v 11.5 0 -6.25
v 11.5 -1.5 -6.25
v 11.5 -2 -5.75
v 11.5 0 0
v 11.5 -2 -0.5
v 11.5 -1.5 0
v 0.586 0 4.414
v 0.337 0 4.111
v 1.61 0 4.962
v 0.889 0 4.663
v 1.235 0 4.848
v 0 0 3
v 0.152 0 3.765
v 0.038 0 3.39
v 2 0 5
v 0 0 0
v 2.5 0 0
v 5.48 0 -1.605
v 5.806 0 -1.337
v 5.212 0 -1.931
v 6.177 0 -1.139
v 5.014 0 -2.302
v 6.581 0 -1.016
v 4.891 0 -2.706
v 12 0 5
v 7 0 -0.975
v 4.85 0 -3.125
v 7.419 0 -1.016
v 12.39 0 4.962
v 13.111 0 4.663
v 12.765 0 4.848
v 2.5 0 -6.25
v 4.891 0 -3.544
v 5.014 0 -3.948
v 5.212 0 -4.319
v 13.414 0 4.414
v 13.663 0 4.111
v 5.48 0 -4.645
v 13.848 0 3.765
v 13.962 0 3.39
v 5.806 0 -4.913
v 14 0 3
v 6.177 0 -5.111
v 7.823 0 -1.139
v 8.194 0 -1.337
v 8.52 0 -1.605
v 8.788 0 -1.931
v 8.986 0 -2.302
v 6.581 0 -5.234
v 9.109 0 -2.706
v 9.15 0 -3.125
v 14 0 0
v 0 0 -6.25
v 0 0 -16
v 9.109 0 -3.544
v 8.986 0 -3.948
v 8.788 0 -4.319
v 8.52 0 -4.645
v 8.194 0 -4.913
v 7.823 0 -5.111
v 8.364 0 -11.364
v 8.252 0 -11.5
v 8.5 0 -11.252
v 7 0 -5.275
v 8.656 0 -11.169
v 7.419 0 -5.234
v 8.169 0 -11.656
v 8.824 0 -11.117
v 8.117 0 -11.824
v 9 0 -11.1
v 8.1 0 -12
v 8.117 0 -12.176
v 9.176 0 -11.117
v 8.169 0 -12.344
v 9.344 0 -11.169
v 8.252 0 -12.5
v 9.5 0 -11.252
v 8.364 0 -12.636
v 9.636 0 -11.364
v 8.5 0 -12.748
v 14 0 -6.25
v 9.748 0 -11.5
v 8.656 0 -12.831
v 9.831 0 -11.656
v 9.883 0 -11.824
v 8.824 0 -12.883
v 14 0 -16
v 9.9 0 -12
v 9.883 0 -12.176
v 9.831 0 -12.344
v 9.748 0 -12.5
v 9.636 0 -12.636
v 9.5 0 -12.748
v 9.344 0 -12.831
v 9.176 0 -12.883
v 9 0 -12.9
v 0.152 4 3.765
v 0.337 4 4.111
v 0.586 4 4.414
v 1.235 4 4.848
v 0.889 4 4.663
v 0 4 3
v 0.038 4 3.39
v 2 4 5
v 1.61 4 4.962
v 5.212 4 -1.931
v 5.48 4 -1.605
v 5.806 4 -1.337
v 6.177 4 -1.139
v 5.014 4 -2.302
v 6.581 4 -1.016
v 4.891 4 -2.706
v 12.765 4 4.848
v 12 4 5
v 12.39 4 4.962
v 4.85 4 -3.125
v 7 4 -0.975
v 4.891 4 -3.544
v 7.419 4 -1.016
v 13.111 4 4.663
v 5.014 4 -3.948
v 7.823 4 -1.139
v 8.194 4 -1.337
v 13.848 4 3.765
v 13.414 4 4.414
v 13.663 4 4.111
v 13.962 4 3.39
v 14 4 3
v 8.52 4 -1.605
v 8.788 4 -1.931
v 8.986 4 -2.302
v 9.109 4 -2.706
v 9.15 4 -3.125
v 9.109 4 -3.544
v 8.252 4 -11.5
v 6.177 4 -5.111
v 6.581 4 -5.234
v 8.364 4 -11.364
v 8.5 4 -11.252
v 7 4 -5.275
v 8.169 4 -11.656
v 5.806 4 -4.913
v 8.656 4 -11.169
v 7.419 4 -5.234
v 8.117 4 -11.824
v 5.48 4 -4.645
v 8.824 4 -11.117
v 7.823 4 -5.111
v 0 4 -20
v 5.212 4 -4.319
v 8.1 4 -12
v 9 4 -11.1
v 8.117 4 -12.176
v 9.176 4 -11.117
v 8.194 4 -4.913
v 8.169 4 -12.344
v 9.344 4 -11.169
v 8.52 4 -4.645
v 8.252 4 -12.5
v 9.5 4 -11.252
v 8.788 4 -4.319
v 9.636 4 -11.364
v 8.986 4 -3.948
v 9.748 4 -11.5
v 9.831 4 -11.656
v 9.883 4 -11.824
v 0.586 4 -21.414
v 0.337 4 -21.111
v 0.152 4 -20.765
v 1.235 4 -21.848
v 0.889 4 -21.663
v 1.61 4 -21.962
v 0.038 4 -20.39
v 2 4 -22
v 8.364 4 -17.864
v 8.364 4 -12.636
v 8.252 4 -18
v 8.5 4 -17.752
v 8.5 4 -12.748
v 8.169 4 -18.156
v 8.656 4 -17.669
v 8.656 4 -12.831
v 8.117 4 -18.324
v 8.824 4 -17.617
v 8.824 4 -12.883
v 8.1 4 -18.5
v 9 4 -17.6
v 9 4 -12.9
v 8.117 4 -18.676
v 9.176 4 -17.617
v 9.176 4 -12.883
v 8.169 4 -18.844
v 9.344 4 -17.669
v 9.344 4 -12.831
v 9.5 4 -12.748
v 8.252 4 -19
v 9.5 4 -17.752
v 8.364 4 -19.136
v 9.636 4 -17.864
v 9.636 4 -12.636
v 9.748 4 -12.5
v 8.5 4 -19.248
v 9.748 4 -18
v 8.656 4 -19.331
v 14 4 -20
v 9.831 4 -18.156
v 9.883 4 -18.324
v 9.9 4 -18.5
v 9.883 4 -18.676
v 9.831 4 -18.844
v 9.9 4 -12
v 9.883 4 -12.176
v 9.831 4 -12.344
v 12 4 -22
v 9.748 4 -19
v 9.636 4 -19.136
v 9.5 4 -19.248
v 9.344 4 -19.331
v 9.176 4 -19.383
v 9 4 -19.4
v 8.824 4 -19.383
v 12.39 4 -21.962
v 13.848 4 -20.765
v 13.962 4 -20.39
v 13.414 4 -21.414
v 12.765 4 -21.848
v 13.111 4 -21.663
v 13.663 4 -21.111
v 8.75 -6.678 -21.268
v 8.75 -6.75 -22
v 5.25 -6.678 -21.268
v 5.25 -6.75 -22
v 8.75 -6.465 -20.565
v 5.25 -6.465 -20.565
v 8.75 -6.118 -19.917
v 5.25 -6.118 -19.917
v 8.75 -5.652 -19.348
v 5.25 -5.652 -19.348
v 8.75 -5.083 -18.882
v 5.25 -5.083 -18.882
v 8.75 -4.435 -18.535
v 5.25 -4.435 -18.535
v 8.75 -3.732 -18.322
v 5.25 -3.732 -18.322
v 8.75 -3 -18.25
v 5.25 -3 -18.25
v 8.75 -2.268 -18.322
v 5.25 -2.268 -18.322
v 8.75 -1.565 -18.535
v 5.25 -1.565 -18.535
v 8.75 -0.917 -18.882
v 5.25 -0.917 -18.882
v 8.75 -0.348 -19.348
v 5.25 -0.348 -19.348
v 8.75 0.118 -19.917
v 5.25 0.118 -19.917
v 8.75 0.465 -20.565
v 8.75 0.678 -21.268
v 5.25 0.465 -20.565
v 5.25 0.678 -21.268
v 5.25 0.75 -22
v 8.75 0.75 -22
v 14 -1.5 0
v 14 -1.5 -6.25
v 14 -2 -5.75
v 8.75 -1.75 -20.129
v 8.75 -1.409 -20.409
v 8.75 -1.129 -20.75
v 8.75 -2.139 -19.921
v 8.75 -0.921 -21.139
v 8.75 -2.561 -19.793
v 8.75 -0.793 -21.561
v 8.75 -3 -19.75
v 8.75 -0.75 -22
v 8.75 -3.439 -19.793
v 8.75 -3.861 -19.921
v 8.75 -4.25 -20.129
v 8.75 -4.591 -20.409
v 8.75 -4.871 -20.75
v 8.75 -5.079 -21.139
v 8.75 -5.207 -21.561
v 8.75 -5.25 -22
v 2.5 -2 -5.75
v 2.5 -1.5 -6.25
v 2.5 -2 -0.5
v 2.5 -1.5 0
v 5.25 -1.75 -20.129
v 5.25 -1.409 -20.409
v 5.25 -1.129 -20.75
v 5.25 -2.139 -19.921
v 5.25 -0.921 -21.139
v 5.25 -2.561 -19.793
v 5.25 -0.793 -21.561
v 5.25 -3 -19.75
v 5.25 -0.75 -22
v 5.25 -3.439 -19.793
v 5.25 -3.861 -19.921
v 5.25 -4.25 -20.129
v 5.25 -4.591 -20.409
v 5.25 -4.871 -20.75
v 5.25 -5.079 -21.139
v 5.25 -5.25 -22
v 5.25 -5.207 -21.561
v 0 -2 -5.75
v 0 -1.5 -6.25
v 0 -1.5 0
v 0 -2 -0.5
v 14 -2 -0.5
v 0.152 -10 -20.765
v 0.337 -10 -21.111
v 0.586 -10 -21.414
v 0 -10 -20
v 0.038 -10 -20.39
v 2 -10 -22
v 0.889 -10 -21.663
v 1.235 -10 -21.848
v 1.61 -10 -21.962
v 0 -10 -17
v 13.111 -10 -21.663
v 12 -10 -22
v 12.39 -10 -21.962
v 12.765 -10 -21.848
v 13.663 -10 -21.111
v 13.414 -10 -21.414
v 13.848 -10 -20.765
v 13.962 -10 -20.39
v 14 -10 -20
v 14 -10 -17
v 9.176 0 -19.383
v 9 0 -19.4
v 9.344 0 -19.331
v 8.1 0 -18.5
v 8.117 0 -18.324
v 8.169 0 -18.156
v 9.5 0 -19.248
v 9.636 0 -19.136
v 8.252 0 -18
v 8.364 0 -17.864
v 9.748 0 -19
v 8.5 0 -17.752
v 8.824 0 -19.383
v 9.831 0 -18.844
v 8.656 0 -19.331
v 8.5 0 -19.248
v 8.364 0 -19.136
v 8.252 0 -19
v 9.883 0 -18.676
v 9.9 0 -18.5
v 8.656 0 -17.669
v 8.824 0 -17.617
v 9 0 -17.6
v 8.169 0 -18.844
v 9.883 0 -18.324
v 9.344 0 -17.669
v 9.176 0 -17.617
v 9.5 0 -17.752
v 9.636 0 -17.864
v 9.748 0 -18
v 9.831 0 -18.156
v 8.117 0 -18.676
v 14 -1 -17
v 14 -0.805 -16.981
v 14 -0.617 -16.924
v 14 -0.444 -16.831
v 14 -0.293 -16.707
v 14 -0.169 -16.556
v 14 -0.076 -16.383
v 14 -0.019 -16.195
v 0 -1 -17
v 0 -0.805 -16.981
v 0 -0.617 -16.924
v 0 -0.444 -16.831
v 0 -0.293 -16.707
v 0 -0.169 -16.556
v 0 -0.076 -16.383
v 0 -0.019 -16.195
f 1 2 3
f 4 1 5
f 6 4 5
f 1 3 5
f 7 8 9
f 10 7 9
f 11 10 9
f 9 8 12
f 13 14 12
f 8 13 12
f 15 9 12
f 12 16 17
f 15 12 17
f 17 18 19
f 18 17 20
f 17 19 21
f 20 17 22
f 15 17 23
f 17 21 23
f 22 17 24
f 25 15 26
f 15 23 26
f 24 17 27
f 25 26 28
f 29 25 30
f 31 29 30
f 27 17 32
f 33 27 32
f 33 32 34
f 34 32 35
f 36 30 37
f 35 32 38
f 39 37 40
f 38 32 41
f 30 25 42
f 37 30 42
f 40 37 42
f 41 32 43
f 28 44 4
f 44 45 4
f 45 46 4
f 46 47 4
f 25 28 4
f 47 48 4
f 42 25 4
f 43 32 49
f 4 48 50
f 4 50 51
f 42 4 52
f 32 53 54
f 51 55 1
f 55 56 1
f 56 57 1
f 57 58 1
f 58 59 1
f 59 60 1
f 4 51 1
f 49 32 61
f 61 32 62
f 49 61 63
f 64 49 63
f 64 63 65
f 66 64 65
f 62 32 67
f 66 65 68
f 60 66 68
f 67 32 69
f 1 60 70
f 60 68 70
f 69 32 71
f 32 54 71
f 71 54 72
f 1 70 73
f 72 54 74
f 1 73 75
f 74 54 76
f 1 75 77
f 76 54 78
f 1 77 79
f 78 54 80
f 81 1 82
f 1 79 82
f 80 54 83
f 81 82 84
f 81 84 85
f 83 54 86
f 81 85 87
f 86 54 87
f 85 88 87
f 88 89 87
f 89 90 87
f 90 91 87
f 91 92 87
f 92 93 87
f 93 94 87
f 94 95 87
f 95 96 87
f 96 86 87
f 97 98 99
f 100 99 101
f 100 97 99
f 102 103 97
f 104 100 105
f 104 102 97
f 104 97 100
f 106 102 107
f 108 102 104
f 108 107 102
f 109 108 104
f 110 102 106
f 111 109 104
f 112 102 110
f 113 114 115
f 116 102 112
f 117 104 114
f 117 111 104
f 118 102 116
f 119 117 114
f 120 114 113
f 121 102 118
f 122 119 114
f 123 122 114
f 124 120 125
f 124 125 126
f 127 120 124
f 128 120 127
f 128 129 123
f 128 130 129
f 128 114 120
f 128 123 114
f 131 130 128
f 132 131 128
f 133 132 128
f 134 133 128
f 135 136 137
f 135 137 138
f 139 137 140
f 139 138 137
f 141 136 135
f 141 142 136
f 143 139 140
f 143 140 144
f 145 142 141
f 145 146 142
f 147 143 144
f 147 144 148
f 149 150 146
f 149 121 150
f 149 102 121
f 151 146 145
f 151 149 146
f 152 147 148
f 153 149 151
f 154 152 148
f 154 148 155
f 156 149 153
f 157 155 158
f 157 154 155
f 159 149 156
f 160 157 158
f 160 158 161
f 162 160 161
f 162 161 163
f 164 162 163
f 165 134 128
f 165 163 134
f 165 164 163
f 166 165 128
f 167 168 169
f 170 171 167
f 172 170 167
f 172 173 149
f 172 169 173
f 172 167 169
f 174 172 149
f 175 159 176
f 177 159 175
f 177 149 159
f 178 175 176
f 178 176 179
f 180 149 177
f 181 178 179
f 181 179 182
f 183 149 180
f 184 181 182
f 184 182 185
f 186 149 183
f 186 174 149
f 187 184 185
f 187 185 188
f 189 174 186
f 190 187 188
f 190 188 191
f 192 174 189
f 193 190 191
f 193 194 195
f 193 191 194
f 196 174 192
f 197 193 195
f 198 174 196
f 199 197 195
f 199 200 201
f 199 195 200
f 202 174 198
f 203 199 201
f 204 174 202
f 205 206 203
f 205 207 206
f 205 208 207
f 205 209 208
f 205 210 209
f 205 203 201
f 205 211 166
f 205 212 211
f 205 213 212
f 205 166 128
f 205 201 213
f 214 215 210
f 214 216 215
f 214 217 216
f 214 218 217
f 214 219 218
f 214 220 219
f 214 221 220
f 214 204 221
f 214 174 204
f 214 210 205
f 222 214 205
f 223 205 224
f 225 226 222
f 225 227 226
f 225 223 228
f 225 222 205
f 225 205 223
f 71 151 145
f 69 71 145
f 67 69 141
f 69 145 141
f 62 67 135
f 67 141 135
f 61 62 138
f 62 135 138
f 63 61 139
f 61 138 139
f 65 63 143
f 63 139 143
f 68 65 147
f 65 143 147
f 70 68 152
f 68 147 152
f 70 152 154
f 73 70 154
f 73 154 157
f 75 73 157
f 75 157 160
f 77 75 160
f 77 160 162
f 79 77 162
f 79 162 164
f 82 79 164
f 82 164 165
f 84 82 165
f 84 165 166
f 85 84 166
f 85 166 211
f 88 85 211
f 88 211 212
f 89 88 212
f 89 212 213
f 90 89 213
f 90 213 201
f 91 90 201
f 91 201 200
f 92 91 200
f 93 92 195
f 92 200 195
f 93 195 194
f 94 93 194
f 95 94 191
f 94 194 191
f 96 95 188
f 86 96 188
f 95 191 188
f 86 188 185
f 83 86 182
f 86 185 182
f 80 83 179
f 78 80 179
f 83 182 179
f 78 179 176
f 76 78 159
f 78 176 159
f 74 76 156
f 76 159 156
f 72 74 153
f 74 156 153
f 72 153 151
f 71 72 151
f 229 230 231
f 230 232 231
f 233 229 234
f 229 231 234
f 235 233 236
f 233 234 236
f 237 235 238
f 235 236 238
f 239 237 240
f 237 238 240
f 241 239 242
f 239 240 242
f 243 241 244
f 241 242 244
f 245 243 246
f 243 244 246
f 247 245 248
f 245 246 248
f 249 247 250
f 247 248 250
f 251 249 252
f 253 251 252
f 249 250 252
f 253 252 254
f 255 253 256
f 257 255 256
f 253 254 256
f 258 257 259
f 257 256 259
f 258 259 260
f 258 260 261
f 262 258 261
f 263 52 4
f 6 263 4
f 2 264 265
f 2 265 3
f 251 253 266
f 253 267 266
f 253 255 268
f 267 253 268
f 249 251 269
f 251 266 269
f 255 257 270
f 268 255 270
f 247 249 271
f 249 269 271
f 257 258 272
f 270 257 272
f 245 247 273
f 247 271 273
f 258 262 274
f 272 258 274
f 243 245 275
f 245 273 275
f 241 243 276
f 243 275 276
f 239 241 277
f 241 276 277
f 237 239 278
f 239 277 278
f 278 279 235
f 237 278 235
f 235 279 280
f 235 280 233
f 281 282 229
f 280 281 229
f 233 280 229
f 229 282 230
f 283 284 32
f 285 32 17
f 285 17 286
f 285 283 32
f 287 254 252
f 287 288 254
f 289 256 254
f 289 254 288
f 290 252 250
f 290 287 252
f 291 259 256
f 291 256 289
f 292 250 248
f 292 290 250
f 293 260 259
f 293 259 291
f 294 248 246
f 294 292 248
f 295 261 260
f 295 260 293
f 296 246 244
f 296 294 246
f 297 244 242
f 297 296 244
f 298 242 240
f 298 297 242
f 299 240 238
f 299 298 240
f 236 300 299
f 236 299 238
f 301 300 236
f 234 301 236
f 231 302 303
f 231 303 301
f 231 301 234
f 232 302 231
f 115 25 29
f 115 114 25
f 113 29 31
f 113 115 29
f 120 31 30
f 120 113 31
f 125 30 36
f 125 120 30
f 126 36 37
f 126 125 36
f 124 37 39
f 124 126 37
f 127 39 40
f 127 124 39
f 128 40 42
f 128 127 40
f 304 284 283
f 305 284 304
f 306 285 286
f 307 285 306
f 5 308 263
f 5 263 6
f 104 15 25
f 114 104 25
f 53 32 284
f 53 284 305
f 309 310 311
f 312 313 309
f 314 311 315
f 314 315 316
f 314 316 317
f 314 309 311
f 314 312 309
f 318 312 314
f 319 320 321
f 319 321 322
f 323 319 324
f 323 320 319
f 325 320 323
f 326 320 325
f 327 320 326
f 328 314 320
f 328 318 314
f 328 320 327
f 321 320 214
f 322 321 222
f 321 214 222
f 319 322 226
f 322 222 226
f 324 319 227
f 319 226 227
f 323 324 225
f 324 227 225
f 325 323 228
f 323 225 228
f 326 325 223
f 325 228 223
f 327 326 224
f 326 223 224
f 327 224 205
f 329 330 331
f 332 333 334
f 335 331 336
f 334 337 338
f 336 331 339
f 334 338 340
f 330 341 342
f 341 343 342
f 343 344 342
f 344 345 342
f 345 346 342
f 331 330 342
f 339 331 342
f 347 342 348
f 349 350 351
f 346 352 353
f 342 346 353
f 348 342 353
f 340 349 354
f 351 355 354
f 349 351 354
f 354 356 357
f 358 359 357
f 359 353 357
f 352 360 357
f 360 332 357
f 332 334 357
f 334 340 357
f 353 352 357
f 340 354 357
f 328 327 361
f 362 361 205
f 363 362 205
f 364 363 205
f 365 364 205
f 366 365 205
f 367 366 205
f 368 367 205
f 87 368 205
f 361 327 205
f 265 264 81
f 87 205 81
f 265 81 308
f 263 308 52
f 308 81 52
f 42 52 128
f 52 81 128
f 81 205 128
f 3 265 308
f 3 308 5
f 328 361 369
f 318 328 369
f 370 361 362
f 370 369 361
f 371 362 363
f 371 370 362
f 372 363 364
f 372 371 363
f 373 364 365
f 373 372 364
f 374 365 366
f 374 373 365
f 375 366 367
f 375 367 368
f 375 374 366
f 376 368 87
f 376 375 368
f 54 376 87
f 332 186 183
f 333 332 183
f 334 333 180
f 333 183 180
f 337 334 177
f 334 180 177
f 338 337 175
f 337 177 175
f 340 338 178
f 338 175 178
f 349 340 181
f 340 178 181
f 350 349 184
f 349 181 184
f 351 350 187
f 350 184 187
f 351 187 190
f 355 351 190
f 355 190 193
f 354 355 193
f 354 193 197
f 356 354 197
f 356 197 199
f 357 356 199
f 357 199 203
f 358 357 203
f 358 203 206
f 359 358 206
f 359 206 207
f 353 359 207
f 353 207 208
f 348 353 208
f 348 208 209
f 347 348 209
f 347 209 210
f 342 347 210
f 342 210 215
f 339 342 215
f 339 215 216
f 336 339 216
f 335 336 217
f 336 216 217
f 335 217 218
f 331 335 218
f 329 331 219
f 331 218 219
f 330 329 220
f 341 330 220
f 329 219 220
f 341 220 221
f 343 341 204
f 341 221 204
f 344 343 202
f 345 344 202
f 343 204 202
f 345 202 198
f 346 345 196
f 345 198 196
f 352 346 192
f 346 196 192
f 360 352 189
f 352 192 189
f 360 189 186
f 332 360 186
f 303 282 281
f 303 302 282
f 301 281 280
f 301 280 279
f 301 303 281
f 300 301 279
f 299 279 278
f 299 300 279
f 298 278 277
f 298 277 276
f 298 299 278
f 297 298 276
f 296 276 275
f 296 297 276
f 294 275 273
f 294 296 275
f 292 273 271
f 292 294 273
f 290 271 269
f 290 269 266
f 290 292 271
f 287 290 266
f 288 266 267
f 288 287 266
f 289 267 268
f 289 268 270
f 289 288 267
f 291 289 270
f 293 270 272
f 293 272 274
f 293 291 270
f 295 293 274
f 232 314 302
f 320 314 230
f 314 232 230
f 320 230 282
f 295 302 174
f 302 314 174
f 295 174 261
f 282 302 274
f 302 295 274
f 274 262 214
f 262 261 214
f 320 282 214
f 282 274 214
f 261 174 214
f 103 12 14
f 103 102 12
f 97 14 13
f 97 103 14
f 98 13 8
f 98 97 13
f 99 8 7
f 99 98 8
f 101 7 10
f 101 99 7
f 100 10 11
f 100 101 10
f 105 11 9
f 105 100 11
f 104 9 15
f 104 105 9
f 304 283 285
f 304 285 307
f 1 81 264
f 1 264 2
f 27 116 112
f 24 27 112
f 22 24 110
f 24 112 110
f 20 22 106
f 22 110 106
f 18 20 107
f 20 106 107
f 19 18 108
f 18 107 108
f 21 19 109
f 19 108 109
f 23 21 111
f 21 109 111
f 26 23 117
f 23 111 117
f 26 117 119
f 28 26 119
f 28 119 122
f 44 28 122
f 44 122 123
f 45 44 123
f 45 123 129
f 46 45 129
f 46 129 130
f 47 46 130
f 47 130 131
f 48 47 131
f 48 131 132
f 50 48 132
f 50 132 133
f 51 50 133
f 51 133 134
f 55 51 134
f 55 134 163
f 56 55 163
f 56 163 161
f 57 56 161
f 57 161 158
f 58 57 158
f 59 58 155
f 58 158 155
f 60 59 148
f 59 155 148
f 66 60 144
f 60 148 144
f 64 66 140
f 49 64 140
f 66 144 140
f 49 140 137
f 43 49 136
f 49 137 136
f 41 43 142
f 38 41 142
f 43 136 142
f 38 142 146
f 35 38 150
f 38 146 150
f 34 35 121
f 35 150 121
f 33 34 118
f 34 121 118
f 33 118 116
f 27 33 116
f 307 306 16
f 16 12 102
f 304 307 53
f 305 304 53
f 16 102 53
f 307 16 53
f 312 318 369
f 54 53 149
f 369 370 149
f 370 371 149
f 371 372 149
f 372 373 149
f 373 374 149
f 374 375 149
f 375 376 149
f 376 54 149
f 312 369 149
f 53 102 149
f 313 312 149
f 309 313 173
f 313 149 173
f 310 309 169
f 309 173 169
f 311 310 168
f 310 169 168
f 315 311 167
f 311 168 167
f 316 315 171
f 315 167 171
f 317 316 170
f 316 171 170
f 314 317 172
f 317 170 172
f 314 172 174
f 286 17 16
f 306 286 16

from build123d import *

# Parameters (mm, degrees)
SKETCH2_W           = 14
SKETCH2_H           = 22
SKETCH2_H_2         = 5
BOSS_EXTRUDE1_DEPTH = 4
SKETCH4_W           = 14
SKETCH4_H           = 6.25
BOSS_EXTRUDE2_DEPTH = 2
SKETCH3_R           = 0.9
SKETCH3_R_2         = 2.15
CUT_EXTRUDE1_DEPTH  = 27.758176321
CHAMFER1_SIZE       = 0.5
FILLET1_R           = 2
CUT_EXTRUDE2_REACH  = 28.758
SKETCH5_W           = 9
SKETCH5_H           = 6.25
BOSS_EXTRUDE3_DEPTH = 10
SKETCH7_W           = 3.5
SKETCH7_H           = 1.5
FILLET2_R           = 1


with BuildPart() as part:
    # Sketch2 → Boss-Extrude1 (new body)
    with BuildSketch(Plane(origin=(0, 0, 0), x_dir=(1, 0, 0), z_dir=(0, 1, 0))):
        with Locations((7, 11)):
            Rectangle(SKETCH2_W, SKETCH2_H)
        with Locations((7, -2.5)):
            Rectangle(SKETCH2_W, SKETCH2_H_2)
    extrude(amount=BOSS_EXTRUDE1_DEPTH)

    # Sketch4 → Boss-Extrude2 (add)
    with BuildSketch(Plane(origin=(0, 0, 0), x_dir=(-1, 0, 0), z_dir=(0, -1, 0))):
        with Locations((-7, 3.125)):
            Rectangle(SKETCH4_W, SKETCH4_H)
    extrude(amount=BOSS_EXTRUDE2_DEPTH)

    # Sketch3 → Cut-Extrude1 (cut, through all)
    with BuildSketch(Plane(origin=(0, 4, 0), x_dir=(1, 0, 0), z_dir=(0, 1, 0))):
        with Locations(Location((9, 18.5, 0), (0, 0, 180))):
            Circle(SKETCH3_R)
        with Locations(Location((9, 12, 0), (0, 0, 180))):
            Circle(SKETCH3_R)
        with Locations(Location((7, 3.125, 0), (0, 0, 180))):
            Circle(SKETCH3_R_2)
    extrude(amount=-CUT_EXTRUDE1_DEPTH, mode=Mode.SUBTRACT)

    # Chamfer1
    chamfer1_edges = [part.edges().sort_by_distance(p)[0] for p in [
        (7, -2, -6.25),
        (7, -2, 0),
    ]]
    chamfer(chamfer1_edges, length=CHAMFER1_SIZE)

    # Fillet1
    fillet1_edges = [part.edges().sort_by_distance(p)[0] for p in [
        (0, 2, -22),
        (14, 2, -22),
        (14, 2, 5),
        (0, 2, 5),
    ]]
    fillet(fillet1_edges, radius=FILLET1_R)

    # Cut-Extrude2: up to this face of the body (flat: up to its plane)
    cut_extrude2_end = Plane(part.part.faces().sort_by_distance((6.952367547, 0, -14.038528118))[0])
    # Sketch5 → Cut-Extrude2 (cut, up to the picked face)
    with BuildSketch(Plane.XZ.offset(2), mode=Mode.PRIVATE) as cut_extrude2_sk1:
        with Locations((7, -3.125)):
            Rectangle(SKETCH5_W, SKETCH5_H)
    cut_extrude2_tool1 = split(extrude(cut_extrude2_sk1.sketch, amount=-CUT_EXTRUDE2_REACH, mode=Mode.PRIVATE), bisect_by=cut_extrude2_end, keep=Keep.BOTH, mode=Mode.PRIVATE)
    add(cut_extrude2_tool1.solids().sort_by(Axis((7, -2, -3.125), (0, 1, 0)))[0], mode=Mode.SUBTRACT)

    # Sketch6 → Boss-Extrude3 (add)
    with BuildSketch(Plane.XZ):
        with BuildLine():
            Line((0, -17), (0, -20))
            ThreePointArc((0, -20), (0.585786438, -21.414213562), (2, -22))
            Line((2, -22), (12, -22))
            ThreePointArc((12, -22), (13.414213562, -21.414213562), (14, -20))
            Line((14, -20), (14, -17))
            Line((14, -17), (0, -17))
        make_face()
    extrude(amount=BOSS_EXTRUDE3_DEPTH)

    # Sketch7 → Cut-Revolve1 (revolve, cut)
    with BuildSketch(Plane(origin=(0, 0, -22), x_dir=(-1, 0, 0), z_dir=(0, 0, -1))):
        with Locations((-7, 0)):
            Rectangle(SKETCH7_W, SKETCH7_H)
    revolve(axis=Axis((14, -3, -22), (-1, 0, 0)), mode=Mode.SUBTRACT)

    # Fillet2
    fillet2_edges = [part.edges().sort_by_distance(p)[0] for p in [
        (7, 0, -17),
    ]]
    fillet(fillet2_edges, radius=FILLET2_R)


solid = part.part
